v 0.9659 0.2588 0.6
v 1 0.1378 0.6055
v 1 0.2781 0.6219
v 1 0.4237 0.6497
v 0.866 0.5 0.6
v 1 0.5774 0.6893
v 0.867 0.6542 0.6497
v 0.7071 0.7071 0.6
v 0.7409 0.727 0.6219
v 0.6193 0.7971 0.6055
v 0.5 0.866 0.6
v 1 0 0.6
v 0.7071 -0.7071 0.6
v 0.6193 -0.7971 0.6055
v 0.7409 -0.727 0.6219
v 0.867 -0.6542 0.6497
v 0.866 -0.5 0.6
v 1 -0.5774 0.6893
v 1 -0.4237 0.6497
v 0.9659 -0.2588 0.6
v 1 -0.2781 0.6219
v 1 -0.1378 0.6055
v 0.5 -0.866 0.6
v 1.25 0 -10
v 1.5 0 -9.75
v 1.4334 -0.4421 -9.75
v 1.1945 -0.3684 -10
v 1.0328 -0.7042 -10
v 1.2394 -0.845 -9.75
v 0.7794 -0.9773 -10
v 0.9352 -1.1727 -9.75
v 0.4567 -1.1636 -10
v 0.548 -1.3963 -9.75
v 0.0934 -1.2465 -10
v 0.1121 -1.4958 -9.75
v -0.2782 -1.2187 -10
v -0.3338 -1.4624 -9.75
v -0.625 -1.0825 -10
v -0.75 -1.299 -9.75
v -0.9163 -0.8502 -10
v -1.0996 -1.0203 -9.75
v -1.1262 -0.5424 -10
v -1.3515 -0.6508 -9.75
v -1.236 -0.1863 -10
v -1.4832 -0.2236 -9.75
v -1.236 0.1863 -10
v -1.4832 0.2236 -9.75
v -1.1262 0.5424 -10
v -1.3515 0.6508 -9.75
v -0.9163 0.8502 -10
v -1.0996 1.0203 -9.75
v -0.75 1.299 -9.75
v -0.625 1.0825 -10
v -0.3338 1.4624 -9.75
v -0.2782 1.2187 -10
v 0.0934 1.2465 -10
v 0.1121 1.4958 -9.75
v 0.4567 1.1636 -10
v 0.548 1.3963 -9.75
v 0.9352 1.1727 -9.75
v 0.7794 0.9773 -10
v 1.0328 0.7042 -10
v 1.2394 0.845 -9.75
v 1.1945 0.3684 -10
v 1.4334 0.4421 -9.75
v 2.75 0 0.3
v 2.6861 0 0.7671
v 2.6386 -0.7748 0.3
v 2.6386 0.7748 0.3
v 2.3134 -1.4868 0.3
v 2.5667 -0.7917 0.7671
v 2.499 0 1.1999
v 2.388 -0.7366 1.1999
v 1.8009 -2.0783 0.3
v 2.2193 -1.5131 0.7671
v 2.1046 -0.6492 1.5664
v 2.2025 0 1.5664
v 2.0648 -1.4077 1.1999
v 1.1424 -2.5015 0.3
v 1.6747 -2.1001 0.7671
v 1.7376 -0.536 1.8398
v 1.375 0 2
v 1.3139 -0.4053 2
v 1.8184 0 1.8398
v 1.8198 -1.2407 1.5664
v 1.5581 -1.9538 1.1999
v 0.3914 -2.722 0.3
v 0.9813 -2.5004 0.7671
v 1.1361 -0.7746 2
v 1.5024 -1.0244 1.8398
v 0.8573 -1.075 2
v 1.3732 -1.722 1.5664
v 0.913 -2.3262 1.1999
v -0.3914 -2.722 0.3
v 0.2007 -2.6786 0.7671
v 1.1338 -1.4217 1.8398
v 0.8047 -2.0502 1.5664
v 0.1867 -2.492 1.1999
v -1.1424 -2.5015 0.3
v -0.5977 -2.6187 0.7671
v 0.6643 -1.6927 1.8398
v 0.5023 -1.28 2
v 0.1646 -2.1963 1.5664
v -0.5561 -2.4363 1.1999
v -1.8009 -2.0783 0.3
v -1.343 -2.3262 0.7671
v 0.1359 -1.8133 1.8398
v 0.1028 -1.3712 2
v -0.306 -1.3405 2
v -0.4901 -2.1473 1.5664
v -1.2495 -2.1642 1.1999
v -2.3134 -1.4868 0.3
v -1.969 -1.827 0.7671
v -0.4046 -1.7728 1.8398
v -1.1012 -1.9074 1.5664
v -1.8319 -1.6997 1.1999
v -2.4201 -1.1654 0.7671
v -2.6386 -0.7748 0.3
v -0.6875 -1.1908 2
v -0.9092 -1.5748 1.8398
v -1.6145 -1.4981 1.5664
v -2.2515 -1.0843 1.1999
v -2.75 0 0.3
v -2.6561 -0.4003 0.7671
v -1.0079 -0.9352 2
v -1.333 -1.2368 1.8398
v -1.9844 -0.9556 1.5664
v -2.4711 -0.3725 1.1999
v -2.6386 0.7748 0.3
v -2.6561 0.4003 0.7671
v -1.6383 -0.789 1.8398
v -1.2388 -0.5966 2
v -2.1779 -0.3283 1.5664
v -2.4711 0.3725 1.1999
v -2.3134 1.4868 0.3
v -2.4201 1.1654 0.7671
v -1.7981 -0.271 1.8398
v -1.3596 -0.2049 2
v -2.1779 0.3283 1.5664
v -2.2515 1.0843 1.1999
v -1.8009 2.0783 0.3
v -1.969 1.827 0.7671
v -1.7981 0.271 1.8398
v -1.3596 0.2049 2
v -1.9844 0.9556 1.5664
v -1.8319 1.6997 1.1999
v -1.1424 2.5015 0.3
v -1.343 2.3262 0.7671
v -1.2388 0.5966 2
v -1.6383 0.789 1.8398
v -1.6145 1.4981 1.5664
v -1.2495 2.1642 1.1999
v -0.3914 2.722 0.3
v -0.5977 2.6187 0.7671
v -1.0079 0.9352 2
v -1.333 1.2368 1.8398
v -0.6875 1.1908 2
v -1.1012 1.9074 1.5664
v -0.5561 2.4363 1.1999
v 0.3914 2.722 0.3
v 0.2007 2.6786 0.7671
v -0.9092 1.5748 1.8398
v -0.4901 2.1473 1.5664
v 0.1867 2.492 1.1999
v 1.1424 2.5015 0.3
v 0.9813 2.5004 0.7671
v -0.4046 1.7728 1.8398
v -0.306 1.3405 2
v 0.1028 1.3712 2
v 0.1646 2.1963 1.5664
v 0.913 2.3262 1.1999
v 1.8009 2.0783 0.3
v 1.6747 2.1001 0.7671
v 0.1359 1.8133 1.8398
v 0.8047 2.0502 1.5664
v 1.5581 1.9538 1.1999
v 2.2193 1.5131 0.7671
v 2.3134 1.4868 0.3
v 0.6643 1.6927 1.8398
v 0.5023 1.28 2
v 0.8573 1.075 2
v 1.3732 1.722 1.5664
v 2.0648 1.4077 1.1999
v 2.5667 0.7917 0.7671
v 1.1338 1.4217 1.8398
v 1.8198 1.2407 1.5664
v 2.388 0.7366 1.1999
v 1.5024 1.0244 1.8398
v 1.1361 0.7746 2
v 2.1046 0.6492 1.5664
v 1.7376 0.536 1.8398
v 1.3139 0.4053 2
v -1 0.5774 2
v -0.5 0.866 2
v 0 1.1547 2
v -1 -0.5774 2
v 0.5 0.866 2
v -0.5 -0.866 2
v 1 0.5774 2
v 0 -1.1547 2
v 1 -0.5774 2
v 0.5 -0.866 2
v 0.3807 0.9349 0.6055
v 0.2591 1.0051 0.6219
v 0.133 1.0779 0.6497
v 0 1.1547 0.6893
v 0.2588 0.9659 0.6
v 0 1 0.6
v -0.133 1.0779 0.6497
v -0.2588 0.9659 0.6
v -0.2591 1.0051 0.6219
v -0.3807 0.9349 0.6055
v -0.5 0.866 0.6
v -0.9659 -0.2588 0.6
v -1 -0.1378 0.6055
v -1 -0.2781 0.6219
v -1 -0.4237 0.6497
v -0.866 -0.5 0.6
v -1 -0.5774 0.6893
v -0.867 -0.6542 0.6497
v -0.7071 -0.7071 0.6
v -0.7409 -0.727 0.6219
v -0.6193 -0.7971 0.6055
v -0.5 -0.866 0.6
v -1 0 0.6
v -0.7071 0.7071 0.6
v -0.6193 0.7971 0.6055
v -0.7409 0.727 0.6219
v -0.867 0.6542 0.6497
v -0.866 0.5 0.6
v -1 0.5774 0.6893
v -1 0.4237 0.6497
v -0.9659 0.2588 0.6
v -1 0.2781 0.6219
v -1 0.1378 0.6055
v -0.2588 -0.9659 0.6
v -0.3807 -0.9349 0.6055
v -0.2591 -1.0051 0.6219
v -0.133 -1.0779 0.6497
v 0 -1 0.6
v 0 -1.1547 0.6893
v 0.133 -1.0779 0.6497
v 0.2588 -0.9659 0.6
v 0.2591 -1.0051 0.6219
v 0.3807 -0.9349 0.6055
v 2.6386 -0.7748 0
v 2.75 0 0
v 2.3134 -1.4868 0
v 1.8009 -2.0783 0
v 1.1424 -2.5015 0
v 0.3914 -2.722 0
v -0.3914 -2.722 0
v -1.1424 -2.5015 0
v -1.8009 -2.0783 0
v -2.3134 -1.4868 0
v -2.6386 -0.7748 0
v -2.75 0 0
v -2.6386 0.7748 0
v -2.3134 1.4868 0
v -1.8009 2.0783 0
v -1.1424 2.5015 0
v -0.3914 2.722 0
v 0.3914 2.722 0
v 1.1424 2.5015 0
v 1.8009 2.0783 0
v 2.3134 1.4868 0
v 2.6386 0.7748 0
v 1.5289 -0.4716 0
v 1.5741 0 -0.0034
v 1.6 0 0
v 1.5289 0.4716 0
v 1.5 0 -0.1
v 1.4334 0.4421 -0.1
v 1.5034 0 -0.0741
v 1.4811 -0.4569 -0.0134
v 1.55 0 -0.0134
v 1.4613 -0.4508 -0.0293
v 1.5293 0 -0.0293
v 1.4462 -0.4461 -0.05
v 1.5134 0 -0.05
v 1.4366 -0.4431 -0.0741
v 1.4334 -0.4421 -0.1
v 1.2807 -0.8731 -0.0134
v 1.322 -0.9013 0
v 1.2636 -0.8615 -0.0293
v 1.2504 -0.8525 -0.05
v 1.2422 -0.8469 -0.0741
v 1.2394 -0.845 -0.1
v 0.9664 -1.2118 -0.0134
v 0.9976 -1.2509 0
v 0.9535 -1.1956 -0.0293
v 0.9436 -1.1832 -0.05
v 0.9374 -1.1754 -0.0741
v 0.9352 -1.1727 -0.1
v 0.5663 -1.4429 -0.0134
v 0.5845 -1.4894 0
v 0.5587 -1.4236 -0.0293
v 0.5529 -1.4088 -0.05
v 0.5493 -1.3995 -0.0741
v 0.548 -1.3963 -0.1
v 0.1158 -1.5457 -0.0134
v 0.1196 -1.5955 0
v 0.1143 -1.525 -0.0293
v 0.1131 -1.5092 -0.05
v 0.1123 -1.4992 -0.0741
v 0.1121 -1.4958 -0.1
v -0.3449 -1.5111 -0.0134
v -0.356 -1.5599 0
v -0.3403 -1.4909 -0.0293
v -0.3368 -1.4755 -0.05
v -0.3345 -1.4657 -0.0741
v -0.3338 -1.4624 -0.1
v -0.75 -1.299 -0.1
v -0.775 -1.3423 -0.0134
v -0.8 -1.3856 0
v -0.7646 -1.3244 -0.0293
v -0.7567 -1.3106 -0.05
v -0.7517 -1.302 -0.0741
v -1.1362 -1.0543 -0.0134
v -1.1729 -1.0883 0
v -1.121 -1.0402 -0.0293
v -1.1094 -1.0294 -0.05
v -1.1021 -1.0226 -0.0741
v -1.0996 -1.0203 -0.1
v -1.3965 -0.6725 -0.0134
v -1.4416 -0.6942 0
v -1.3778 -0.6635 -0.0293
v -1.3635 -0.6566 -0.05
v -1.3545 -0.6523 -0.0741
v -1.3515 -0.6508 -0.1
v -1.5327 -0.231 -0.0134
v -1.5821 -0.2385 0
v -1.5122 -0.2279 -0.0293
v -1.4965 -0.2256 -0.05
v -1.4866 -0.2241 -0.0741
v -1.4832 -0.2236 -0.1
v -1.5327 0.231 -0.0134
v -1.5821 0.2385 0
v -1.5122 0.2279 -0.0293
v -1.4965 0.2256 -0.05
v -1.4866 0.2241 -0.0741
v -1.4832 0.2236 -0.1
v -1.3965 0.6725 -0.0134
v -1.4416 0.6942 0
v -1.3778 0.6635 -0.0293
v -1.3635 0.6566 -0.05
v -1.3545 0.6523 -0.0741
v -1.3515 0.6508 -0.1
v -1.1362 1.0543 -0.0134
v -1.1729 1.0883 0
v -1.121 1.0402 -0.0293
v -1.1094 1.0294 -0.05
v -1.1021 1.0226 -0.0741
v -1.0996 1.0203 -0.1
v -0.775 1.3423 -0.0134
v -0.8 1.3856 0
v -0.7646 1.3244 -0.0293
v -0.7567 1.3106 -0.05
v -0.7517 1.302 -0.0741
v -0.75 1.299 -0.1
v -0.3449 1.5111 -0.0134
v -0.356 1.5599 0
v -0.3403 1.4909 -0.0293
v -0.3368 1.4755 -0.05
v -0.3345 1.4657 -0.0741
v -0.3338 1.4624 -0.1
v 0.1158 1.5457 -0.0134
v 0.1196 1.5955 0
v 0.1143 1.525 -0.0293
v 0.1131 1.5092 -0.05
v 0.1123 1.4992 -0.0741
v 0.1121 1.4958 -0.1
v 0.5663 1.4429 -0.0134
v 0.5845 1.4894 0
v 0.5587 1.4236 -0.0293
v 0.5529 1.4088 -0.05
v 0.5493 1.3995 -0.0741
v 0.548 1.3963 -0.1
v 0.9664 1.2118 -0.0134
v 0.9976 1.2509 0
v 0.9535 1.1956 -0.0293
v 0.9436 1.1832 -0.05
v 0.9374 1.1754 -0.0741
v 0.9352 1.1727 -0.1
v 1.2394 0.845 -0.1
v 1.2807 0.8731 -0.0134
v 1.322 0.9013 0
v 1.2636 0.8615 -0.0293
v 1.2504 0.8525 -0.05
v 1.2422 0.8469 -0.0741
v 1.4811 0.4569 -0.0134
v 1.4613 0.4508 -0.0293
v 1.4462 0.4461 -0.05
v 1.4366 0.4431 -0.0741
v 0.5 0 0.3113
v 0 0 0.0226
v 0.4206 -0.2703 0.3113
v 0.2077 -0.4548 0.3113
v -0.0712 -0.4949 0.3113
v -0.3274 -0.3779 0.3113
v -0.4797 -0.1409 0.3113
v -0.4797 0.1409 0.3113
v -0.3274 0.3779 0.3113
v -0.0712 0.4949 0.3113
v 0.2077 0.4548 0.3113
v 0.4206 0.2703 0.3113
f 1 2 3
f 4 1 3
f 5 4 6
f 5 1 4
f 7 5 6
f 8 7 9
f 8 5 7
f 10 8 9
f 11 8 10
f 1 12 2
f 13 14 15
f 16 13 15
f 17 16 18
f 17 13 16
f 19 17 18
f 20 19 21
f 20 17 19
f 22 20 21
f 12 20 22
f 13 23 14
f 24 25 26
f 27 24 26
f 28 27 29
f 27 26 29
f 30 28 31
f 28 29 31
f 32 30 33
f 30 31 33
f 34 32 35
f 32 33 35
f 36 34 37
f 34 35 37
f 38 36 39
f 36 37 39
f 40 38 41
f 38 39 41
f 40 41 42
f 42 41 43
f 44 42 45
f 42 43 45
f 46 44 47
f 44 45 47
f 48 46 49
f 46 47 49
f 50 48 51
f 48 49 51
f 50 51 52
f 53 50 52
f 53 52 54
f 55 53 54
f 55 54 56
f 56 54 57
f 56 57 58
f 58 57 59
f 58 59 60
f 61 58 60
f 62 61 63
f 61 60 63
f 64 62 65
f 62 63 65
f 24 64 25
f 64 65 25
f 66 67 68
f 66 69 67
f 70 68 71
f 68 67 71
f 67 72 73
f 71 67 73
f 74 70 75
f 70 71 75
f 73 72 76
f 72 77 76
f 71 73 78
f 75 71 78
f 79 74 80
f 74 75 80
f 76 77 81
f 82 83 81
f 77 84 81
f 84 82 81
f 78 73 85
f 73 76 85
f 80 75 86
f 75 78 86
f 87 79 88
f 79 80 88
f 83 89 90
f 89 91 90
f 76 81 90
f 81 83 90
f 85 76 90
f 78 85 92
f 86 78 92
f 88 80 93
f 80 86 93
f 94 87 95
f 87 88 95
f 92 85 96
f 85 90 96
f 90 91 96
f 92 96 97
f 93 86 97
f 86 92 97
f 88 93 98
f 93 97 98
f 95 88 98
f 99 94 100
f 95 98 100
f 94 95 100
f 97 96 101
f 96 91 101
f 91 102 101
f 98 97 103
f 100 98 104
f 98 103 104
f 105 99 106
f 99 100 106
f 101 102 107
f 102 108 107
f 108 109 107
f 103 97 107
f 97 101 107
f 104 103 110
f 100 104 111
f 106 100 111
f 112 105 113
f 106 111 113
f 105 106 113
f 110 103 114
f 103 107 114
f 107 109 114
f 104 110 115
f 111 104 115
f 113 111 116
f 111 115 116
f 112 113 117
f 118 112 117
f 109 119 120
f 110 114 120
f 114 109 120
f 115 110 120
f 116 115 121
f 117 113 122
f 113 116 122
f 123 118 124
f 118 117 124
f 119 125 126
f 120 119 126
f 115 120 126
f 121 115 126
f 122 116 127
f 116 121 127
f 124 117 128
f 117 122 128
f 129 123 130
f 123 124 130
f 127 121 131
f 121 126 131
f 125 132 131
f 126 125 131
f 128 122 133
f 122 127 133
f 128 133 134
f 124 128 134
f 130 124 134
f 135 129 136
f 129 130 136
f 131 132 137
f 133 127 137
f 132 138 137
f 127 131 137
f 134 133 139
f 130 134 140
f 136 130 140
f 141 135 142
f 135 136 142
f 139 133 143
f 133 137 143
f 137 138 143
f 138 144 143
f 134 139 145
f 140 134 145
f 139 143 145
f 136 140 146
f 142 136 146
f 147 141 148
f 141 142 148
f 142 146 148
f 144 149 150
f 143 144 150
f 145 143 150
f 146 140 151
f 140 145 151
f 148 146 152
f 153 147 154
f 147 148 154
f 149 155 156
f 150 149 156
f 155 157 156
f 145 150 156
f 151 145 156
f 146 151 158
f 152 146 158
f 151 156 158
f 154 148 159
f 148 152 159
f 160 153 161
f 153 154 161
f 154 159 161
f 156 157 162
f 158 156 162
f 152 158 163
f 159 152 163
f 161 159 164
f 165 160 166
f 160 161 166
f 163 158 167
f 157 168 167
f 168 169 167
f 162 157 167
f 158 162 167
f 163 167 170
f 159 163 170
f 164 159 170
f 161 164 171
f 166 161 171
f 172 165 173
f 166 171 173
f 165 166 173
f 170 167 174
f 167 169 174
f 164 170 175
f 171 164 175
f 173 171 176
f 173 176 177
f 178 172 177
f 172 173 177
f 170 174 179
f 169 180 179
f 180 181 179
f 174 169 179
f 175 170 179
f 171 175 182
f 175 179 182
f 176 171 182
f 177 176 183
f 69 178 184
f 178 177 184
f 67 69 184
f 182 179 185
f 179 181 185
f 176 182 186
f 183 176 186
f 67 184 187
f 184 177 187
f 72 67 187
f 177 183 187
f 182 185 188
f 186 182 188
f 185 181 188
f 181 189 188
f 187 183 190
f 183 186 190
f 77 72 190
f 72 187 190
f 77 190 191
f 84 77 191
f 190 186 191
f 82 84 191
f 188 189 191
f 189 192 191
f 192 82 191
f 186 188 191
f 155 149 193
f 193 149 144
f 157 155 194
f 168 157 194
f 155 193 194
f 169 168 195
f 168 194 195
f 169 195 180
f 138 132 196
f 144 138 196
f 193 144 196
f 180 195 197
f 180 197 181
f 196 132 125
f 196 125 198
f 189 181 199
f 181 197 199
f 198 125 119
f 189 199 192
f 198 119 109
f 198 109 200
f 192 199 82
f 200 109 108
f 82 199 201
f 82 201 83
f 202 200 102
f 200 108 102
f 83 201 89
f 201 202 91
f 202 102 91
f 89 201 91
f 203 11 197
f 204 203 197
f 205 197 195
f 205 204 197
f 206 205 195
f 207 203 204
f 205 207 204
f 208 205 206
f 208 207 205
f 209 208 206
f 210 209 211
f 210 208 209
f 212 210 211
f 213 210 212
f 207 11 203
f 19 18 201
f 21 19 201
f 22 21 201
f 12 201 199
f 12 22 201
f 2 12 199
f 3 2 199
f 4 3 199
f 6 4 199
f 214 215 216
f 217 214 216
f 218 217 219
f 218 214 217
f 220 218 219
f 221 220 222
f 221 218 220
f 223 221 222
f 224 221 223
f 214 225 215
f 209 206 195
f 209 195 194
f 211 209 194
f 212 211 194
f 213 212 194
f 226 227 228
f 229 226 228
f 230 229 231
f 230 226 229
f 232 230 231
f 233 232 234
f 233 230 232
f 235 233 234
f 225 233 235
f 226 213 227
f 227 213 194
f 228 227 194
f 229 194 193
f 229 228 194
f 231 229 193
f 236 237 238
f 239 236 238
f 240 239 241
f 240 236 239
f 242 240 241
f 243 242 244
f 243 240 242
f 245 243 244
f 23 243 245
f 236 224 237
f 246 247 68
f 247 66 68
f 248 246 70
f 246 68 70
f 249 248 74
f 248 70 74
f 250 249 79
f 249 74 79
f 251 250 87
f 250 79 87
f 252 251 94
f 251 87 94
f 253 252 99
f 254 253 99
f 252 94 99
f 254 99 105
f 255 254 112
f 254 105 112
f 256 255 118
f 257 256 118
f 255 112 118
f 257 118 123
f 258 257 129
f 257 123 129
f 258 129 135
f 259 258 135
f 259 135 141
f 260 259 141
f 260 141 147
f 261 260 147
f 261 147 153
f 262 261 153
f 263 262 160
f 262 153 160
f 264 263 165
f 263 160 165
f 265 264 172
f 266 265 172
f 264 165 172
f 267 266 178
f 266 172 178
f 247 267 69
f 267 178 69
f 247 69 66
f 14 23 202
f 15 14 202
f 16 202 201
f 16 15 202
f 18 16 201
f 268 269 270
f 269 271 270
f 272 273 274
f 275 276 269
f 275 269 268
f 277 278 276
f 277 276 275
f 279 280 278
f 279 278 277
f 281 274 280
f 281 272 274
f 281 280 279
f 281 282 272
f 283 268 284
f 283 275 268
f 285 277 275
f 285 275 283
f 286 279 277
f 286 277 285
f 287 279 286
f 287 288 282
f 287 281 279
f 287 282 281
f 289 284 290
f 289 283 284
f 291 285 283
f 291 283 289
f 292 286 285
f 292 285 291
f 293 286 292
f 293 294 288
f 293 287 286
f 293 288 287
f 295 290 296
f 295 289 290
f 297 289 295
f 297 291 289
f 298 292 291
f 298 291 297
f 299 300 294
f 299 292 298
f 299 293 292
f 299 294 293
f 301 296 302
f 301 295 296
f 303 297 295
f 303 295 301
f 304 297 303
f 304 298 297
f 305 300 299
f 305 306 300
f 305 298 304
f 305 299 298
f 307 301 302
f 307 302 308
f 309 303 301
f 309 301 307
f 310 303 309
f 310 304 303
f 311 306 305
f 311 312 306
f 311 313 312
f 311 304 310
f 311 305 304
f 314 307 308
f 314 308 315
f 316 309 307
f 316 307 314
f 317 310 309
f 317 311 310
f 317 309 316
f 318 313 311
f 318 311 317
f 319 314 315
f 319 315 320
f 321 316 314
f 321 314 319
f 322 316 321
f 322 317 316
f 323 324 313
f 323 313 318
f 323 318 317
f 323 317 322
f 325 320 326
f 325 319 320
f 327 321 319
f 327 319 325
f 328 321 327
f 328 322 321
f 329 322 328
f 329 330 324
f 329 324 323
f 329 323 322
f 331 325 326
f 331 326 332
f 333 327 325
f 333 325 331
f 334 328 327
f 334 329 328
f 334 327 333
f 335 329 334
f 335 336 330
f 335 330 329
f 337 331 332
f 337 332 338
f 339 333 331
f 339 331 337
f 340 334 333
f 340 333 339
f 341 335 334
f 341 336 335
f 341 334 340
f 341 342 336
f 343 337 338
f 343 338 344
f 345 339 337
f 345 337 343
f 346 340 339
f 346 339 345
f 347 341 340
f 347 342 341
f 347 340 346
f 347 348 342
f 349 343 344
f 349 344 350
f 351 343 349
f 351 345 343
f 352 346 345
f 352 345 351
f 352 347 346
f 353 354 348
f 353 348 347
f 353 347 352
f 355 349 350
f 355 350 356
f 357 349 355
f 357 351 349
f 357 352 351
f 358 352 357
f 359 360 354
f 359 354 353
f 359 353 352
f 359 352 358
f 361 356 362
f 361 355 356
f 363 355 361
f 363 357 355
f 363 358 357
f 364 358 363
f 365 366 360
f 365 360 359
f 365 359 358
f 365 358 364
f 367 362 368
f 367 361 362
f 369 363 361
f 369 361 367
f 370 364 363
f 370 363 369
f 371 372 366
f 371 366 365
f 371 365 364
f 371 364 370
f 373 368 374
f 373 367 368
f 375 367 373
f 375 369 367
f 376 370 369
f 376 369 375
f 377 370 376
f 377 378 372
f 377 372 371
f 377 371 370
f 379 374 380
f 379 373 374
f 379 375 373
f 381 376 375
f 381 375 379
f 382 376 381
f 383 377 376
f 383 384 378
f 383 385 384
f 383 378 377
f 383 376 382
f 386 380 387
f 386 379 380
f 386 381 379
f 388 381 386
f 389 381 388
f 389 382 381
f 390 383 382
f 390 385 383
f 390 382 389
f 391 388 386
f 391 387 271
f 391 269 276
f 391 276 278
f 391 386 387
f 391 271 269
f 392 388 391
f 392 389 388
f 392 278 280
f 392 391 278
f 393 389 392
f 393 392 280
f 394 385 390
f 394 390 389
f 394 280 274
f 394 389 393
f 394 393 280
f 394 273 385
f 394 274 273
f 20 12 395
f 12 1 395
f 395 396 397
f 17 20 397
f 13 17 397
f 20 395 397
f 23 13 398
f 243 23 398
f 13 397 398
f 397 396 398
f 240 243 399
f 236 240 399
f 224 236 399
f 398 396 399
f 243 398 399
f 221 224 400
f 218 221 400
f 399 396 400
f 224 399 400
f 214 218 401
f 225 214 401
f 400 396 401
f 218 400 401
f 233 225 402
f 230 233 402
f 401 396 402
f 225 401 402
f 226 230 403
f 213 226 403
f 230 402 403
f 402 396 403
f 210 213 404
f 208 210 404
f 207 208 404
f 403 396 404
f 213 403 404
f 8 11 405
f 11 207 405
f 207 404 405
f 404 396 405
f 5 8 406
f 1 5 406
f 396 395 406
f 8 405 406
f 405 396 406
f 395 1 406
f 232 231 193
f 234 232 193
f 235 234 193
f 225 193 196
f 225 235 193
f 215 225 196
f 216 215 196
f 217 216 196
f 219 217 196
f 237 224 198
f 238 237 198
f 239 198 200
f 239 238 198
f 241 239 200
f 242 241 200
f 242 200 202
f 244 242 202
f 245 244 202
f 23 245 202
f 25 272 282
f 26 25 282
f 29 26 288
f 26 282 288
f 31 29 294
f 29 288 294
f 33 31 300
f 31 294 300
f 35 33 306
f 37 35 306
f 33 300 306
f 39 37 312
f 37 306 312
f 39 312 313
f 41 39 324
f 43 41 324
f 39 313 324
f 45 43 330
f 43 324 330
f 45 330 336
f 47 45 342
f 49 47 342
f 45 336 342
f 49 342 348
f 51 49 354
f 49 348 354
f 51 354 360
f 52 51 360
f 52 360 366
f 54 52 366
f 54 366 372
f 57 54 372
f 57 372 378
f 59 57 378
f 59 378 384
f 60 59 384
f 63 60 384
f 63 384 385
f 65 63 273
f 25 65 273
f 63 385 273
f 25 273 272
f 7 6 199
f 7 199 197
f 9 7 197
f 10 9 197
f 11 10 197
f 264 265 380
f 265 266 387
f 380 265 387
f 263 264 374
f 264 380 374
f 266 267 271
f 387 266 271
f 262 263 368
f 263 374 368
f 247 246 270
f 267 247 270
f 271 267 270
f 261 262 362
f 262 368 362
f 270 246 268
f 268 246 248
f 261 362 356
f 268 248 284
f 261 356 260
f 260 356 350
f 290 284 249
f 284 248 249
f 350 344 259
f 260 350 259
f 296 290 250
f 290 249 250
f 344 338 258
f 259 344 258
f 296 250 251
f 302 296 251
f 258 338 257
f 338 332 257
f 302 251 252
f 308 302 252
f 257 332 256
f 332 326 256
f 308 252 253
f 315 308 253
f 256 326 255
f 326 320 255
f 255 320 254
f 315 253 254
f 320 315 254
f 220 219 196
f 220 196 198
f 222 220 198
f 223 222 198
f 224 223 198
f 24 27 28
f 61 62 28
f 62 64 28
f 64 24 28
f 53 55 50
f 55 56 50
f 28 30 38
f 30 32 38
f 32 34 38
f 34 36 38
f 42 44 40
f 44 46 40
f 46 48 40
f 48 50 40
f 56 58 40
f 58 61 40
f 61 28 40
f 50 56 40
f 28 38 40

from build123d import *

# Parameters (mm, degrees)
CHAMFER1_SIZE      = 0.25
CUT_EXTRUDE1_START = -1.4000001
CUT_EXTRUDE1_DEPTH = 1.4000001
FILLET1_R          = 0.1


with BuildPart() as part:
    # Sketch1 → Revolve1 (revolve)
    with BuildSketch(Plane(origin=(0, 0, 0), x_dir=(0, 0, -1), z_dir=(1, 0, 0)), mode=Mode.PRIVATE) as revolve1_sk:
        with BuildLine():
            Line((10, 0), (10, 1.5))
            Line((10, 1.5), (0, 1.5))
            Line((0, 1.5), (0, 2.75))
            Line((0, 2.75), (-0.3, 2.75))
            ThreePointArc((-0.3, 2.75), (-1.39323202, 2.363223225), (-2, 1.375))
            Line((-2, 1.375), (-2, 0))
            Line((-2, 0), (10, 0))
        make_face()
    revolve(revolve1_sk.sketch.rotate(Axis((0, 0, 30.809969789), (0, 0, -1)), 90), axis=Axis((0, 0, 30.809969789), (0, 0, -1)))

    # Chamfer1
    chamfer1_edges = [part.edges().sort_by_distance(p)[0] for p in [
        (-1.5, 0, -10),
    ]]
    chamfer(chamfer1_edges, length=CHAMFER1_SIZE)

    # Sketch2 → Cut-Revolve1 (revolve, cut)
    with BuildSketch(Plane(origin=(0, 0, 0), x_dir=(0, 0, -1), z_dir=(1, 0, 0)), mode=Mode.PRIVATE) as cut_revolve1_sk:
        Polygon((-2, 0), (-2, 1), (-0.6, 1), (-0.022649731, 0), align=None)
    revolve(cut_revolve1_sk.sketch.rotate(Axis((0, 0, 2.452500839), (0, 0, -1)), 90), axis=Axis((0, 0, 2.452500839), (0, 0, -1)), mode=Mode.SUBTRACT)

    # Cut-Extrude1: read off the stored shape, not the designer's step
    # Cut-Extrude1 outline → Cut-Extrude1 (cut)
    with BuildSketch(Plane.XY.offset(2).offset(CUT_EXTRUDE1_START)):
        with BuildLine():
            Line((1, 0), (1, 0.577350269))
            Line((1, 0.577350269), (0.500019222, 0.866014306))
            ThreePointArc((0.500019222, 0.866014306), (0.866030953, 0.499990389), (1, 0))
        make_face()
        with BuildLine():
            ThreePointArc((-0.500019222, 0.866014306), (0, 1), (0.500019222, 0.866014306))
            Line((0.500019222, 0.866014306), (0, 1.154700538))
            Line((0, 1.154700538), (-0.500019222, 0.866014306))
        make_face()
        with BuildLine():
            Line((1, -0.577350269), (1, 0))
            ThreePointArc((1, 0), (0.866030953, -0.499990389), (0.500019222, -0.866014306))
            Line((0.500019222, -0.866014306), (1, -0.577350269))
        make_face()
        with BuildLine():
            ThreePointArc((-1, 0), (-0.866030953, 0.499990389), (-0.500019222, 0.866014306))
            Line((-0.500019222, 0.866014306), (-1, 0.577350269))
            Line((-1, 0.577350269), (-1, 0))
        make_face()
        with BuildLine():
            Line((0, -1.154700538), (0.500019222, -0.866014306))
            ThreePointArc((0.500019222, -0.866014306), (0, -1), (-0.500019222, -0.866014306))
            Line((-0.500019222, -0.866014306), (0, -1.154700538))
        make_face()
        with BuildLine():
            ThreePointArc((-0.500019222, -0.866014306), (-0.866030953, -0.499990389), (-1, 0))
            Line((-1, 0), (-1, -0.577350269))
            Line((-1, -0.577350269), (-0.500019222, -0.866014306))
        make_face()
    extrude(amount=CUT_EXTRUDE1_DEPTH, mode=Mode.SUBTRACT)

    # Cut-Extrude1 2 outline → Cut-Extrude1 2 (revolve)
    with BuildSketch(Plane.XZ):
        Polygon((1.154700598, 0.689316432), (0.999999957, 0.599999975), (1.154700538, 0.5999999), align=None)
    revolve(axis=Axis((0, 0, 0), (0, 0, 1)))

    # Fillet1
    fillet1_edges = [part.edges().sort_by_distance(p)[0] for p in [
        (-1.5, 0, 0),
    ]]
    fillet(fillet1_edges, radius=FILLET1_R)


solid = part.part
